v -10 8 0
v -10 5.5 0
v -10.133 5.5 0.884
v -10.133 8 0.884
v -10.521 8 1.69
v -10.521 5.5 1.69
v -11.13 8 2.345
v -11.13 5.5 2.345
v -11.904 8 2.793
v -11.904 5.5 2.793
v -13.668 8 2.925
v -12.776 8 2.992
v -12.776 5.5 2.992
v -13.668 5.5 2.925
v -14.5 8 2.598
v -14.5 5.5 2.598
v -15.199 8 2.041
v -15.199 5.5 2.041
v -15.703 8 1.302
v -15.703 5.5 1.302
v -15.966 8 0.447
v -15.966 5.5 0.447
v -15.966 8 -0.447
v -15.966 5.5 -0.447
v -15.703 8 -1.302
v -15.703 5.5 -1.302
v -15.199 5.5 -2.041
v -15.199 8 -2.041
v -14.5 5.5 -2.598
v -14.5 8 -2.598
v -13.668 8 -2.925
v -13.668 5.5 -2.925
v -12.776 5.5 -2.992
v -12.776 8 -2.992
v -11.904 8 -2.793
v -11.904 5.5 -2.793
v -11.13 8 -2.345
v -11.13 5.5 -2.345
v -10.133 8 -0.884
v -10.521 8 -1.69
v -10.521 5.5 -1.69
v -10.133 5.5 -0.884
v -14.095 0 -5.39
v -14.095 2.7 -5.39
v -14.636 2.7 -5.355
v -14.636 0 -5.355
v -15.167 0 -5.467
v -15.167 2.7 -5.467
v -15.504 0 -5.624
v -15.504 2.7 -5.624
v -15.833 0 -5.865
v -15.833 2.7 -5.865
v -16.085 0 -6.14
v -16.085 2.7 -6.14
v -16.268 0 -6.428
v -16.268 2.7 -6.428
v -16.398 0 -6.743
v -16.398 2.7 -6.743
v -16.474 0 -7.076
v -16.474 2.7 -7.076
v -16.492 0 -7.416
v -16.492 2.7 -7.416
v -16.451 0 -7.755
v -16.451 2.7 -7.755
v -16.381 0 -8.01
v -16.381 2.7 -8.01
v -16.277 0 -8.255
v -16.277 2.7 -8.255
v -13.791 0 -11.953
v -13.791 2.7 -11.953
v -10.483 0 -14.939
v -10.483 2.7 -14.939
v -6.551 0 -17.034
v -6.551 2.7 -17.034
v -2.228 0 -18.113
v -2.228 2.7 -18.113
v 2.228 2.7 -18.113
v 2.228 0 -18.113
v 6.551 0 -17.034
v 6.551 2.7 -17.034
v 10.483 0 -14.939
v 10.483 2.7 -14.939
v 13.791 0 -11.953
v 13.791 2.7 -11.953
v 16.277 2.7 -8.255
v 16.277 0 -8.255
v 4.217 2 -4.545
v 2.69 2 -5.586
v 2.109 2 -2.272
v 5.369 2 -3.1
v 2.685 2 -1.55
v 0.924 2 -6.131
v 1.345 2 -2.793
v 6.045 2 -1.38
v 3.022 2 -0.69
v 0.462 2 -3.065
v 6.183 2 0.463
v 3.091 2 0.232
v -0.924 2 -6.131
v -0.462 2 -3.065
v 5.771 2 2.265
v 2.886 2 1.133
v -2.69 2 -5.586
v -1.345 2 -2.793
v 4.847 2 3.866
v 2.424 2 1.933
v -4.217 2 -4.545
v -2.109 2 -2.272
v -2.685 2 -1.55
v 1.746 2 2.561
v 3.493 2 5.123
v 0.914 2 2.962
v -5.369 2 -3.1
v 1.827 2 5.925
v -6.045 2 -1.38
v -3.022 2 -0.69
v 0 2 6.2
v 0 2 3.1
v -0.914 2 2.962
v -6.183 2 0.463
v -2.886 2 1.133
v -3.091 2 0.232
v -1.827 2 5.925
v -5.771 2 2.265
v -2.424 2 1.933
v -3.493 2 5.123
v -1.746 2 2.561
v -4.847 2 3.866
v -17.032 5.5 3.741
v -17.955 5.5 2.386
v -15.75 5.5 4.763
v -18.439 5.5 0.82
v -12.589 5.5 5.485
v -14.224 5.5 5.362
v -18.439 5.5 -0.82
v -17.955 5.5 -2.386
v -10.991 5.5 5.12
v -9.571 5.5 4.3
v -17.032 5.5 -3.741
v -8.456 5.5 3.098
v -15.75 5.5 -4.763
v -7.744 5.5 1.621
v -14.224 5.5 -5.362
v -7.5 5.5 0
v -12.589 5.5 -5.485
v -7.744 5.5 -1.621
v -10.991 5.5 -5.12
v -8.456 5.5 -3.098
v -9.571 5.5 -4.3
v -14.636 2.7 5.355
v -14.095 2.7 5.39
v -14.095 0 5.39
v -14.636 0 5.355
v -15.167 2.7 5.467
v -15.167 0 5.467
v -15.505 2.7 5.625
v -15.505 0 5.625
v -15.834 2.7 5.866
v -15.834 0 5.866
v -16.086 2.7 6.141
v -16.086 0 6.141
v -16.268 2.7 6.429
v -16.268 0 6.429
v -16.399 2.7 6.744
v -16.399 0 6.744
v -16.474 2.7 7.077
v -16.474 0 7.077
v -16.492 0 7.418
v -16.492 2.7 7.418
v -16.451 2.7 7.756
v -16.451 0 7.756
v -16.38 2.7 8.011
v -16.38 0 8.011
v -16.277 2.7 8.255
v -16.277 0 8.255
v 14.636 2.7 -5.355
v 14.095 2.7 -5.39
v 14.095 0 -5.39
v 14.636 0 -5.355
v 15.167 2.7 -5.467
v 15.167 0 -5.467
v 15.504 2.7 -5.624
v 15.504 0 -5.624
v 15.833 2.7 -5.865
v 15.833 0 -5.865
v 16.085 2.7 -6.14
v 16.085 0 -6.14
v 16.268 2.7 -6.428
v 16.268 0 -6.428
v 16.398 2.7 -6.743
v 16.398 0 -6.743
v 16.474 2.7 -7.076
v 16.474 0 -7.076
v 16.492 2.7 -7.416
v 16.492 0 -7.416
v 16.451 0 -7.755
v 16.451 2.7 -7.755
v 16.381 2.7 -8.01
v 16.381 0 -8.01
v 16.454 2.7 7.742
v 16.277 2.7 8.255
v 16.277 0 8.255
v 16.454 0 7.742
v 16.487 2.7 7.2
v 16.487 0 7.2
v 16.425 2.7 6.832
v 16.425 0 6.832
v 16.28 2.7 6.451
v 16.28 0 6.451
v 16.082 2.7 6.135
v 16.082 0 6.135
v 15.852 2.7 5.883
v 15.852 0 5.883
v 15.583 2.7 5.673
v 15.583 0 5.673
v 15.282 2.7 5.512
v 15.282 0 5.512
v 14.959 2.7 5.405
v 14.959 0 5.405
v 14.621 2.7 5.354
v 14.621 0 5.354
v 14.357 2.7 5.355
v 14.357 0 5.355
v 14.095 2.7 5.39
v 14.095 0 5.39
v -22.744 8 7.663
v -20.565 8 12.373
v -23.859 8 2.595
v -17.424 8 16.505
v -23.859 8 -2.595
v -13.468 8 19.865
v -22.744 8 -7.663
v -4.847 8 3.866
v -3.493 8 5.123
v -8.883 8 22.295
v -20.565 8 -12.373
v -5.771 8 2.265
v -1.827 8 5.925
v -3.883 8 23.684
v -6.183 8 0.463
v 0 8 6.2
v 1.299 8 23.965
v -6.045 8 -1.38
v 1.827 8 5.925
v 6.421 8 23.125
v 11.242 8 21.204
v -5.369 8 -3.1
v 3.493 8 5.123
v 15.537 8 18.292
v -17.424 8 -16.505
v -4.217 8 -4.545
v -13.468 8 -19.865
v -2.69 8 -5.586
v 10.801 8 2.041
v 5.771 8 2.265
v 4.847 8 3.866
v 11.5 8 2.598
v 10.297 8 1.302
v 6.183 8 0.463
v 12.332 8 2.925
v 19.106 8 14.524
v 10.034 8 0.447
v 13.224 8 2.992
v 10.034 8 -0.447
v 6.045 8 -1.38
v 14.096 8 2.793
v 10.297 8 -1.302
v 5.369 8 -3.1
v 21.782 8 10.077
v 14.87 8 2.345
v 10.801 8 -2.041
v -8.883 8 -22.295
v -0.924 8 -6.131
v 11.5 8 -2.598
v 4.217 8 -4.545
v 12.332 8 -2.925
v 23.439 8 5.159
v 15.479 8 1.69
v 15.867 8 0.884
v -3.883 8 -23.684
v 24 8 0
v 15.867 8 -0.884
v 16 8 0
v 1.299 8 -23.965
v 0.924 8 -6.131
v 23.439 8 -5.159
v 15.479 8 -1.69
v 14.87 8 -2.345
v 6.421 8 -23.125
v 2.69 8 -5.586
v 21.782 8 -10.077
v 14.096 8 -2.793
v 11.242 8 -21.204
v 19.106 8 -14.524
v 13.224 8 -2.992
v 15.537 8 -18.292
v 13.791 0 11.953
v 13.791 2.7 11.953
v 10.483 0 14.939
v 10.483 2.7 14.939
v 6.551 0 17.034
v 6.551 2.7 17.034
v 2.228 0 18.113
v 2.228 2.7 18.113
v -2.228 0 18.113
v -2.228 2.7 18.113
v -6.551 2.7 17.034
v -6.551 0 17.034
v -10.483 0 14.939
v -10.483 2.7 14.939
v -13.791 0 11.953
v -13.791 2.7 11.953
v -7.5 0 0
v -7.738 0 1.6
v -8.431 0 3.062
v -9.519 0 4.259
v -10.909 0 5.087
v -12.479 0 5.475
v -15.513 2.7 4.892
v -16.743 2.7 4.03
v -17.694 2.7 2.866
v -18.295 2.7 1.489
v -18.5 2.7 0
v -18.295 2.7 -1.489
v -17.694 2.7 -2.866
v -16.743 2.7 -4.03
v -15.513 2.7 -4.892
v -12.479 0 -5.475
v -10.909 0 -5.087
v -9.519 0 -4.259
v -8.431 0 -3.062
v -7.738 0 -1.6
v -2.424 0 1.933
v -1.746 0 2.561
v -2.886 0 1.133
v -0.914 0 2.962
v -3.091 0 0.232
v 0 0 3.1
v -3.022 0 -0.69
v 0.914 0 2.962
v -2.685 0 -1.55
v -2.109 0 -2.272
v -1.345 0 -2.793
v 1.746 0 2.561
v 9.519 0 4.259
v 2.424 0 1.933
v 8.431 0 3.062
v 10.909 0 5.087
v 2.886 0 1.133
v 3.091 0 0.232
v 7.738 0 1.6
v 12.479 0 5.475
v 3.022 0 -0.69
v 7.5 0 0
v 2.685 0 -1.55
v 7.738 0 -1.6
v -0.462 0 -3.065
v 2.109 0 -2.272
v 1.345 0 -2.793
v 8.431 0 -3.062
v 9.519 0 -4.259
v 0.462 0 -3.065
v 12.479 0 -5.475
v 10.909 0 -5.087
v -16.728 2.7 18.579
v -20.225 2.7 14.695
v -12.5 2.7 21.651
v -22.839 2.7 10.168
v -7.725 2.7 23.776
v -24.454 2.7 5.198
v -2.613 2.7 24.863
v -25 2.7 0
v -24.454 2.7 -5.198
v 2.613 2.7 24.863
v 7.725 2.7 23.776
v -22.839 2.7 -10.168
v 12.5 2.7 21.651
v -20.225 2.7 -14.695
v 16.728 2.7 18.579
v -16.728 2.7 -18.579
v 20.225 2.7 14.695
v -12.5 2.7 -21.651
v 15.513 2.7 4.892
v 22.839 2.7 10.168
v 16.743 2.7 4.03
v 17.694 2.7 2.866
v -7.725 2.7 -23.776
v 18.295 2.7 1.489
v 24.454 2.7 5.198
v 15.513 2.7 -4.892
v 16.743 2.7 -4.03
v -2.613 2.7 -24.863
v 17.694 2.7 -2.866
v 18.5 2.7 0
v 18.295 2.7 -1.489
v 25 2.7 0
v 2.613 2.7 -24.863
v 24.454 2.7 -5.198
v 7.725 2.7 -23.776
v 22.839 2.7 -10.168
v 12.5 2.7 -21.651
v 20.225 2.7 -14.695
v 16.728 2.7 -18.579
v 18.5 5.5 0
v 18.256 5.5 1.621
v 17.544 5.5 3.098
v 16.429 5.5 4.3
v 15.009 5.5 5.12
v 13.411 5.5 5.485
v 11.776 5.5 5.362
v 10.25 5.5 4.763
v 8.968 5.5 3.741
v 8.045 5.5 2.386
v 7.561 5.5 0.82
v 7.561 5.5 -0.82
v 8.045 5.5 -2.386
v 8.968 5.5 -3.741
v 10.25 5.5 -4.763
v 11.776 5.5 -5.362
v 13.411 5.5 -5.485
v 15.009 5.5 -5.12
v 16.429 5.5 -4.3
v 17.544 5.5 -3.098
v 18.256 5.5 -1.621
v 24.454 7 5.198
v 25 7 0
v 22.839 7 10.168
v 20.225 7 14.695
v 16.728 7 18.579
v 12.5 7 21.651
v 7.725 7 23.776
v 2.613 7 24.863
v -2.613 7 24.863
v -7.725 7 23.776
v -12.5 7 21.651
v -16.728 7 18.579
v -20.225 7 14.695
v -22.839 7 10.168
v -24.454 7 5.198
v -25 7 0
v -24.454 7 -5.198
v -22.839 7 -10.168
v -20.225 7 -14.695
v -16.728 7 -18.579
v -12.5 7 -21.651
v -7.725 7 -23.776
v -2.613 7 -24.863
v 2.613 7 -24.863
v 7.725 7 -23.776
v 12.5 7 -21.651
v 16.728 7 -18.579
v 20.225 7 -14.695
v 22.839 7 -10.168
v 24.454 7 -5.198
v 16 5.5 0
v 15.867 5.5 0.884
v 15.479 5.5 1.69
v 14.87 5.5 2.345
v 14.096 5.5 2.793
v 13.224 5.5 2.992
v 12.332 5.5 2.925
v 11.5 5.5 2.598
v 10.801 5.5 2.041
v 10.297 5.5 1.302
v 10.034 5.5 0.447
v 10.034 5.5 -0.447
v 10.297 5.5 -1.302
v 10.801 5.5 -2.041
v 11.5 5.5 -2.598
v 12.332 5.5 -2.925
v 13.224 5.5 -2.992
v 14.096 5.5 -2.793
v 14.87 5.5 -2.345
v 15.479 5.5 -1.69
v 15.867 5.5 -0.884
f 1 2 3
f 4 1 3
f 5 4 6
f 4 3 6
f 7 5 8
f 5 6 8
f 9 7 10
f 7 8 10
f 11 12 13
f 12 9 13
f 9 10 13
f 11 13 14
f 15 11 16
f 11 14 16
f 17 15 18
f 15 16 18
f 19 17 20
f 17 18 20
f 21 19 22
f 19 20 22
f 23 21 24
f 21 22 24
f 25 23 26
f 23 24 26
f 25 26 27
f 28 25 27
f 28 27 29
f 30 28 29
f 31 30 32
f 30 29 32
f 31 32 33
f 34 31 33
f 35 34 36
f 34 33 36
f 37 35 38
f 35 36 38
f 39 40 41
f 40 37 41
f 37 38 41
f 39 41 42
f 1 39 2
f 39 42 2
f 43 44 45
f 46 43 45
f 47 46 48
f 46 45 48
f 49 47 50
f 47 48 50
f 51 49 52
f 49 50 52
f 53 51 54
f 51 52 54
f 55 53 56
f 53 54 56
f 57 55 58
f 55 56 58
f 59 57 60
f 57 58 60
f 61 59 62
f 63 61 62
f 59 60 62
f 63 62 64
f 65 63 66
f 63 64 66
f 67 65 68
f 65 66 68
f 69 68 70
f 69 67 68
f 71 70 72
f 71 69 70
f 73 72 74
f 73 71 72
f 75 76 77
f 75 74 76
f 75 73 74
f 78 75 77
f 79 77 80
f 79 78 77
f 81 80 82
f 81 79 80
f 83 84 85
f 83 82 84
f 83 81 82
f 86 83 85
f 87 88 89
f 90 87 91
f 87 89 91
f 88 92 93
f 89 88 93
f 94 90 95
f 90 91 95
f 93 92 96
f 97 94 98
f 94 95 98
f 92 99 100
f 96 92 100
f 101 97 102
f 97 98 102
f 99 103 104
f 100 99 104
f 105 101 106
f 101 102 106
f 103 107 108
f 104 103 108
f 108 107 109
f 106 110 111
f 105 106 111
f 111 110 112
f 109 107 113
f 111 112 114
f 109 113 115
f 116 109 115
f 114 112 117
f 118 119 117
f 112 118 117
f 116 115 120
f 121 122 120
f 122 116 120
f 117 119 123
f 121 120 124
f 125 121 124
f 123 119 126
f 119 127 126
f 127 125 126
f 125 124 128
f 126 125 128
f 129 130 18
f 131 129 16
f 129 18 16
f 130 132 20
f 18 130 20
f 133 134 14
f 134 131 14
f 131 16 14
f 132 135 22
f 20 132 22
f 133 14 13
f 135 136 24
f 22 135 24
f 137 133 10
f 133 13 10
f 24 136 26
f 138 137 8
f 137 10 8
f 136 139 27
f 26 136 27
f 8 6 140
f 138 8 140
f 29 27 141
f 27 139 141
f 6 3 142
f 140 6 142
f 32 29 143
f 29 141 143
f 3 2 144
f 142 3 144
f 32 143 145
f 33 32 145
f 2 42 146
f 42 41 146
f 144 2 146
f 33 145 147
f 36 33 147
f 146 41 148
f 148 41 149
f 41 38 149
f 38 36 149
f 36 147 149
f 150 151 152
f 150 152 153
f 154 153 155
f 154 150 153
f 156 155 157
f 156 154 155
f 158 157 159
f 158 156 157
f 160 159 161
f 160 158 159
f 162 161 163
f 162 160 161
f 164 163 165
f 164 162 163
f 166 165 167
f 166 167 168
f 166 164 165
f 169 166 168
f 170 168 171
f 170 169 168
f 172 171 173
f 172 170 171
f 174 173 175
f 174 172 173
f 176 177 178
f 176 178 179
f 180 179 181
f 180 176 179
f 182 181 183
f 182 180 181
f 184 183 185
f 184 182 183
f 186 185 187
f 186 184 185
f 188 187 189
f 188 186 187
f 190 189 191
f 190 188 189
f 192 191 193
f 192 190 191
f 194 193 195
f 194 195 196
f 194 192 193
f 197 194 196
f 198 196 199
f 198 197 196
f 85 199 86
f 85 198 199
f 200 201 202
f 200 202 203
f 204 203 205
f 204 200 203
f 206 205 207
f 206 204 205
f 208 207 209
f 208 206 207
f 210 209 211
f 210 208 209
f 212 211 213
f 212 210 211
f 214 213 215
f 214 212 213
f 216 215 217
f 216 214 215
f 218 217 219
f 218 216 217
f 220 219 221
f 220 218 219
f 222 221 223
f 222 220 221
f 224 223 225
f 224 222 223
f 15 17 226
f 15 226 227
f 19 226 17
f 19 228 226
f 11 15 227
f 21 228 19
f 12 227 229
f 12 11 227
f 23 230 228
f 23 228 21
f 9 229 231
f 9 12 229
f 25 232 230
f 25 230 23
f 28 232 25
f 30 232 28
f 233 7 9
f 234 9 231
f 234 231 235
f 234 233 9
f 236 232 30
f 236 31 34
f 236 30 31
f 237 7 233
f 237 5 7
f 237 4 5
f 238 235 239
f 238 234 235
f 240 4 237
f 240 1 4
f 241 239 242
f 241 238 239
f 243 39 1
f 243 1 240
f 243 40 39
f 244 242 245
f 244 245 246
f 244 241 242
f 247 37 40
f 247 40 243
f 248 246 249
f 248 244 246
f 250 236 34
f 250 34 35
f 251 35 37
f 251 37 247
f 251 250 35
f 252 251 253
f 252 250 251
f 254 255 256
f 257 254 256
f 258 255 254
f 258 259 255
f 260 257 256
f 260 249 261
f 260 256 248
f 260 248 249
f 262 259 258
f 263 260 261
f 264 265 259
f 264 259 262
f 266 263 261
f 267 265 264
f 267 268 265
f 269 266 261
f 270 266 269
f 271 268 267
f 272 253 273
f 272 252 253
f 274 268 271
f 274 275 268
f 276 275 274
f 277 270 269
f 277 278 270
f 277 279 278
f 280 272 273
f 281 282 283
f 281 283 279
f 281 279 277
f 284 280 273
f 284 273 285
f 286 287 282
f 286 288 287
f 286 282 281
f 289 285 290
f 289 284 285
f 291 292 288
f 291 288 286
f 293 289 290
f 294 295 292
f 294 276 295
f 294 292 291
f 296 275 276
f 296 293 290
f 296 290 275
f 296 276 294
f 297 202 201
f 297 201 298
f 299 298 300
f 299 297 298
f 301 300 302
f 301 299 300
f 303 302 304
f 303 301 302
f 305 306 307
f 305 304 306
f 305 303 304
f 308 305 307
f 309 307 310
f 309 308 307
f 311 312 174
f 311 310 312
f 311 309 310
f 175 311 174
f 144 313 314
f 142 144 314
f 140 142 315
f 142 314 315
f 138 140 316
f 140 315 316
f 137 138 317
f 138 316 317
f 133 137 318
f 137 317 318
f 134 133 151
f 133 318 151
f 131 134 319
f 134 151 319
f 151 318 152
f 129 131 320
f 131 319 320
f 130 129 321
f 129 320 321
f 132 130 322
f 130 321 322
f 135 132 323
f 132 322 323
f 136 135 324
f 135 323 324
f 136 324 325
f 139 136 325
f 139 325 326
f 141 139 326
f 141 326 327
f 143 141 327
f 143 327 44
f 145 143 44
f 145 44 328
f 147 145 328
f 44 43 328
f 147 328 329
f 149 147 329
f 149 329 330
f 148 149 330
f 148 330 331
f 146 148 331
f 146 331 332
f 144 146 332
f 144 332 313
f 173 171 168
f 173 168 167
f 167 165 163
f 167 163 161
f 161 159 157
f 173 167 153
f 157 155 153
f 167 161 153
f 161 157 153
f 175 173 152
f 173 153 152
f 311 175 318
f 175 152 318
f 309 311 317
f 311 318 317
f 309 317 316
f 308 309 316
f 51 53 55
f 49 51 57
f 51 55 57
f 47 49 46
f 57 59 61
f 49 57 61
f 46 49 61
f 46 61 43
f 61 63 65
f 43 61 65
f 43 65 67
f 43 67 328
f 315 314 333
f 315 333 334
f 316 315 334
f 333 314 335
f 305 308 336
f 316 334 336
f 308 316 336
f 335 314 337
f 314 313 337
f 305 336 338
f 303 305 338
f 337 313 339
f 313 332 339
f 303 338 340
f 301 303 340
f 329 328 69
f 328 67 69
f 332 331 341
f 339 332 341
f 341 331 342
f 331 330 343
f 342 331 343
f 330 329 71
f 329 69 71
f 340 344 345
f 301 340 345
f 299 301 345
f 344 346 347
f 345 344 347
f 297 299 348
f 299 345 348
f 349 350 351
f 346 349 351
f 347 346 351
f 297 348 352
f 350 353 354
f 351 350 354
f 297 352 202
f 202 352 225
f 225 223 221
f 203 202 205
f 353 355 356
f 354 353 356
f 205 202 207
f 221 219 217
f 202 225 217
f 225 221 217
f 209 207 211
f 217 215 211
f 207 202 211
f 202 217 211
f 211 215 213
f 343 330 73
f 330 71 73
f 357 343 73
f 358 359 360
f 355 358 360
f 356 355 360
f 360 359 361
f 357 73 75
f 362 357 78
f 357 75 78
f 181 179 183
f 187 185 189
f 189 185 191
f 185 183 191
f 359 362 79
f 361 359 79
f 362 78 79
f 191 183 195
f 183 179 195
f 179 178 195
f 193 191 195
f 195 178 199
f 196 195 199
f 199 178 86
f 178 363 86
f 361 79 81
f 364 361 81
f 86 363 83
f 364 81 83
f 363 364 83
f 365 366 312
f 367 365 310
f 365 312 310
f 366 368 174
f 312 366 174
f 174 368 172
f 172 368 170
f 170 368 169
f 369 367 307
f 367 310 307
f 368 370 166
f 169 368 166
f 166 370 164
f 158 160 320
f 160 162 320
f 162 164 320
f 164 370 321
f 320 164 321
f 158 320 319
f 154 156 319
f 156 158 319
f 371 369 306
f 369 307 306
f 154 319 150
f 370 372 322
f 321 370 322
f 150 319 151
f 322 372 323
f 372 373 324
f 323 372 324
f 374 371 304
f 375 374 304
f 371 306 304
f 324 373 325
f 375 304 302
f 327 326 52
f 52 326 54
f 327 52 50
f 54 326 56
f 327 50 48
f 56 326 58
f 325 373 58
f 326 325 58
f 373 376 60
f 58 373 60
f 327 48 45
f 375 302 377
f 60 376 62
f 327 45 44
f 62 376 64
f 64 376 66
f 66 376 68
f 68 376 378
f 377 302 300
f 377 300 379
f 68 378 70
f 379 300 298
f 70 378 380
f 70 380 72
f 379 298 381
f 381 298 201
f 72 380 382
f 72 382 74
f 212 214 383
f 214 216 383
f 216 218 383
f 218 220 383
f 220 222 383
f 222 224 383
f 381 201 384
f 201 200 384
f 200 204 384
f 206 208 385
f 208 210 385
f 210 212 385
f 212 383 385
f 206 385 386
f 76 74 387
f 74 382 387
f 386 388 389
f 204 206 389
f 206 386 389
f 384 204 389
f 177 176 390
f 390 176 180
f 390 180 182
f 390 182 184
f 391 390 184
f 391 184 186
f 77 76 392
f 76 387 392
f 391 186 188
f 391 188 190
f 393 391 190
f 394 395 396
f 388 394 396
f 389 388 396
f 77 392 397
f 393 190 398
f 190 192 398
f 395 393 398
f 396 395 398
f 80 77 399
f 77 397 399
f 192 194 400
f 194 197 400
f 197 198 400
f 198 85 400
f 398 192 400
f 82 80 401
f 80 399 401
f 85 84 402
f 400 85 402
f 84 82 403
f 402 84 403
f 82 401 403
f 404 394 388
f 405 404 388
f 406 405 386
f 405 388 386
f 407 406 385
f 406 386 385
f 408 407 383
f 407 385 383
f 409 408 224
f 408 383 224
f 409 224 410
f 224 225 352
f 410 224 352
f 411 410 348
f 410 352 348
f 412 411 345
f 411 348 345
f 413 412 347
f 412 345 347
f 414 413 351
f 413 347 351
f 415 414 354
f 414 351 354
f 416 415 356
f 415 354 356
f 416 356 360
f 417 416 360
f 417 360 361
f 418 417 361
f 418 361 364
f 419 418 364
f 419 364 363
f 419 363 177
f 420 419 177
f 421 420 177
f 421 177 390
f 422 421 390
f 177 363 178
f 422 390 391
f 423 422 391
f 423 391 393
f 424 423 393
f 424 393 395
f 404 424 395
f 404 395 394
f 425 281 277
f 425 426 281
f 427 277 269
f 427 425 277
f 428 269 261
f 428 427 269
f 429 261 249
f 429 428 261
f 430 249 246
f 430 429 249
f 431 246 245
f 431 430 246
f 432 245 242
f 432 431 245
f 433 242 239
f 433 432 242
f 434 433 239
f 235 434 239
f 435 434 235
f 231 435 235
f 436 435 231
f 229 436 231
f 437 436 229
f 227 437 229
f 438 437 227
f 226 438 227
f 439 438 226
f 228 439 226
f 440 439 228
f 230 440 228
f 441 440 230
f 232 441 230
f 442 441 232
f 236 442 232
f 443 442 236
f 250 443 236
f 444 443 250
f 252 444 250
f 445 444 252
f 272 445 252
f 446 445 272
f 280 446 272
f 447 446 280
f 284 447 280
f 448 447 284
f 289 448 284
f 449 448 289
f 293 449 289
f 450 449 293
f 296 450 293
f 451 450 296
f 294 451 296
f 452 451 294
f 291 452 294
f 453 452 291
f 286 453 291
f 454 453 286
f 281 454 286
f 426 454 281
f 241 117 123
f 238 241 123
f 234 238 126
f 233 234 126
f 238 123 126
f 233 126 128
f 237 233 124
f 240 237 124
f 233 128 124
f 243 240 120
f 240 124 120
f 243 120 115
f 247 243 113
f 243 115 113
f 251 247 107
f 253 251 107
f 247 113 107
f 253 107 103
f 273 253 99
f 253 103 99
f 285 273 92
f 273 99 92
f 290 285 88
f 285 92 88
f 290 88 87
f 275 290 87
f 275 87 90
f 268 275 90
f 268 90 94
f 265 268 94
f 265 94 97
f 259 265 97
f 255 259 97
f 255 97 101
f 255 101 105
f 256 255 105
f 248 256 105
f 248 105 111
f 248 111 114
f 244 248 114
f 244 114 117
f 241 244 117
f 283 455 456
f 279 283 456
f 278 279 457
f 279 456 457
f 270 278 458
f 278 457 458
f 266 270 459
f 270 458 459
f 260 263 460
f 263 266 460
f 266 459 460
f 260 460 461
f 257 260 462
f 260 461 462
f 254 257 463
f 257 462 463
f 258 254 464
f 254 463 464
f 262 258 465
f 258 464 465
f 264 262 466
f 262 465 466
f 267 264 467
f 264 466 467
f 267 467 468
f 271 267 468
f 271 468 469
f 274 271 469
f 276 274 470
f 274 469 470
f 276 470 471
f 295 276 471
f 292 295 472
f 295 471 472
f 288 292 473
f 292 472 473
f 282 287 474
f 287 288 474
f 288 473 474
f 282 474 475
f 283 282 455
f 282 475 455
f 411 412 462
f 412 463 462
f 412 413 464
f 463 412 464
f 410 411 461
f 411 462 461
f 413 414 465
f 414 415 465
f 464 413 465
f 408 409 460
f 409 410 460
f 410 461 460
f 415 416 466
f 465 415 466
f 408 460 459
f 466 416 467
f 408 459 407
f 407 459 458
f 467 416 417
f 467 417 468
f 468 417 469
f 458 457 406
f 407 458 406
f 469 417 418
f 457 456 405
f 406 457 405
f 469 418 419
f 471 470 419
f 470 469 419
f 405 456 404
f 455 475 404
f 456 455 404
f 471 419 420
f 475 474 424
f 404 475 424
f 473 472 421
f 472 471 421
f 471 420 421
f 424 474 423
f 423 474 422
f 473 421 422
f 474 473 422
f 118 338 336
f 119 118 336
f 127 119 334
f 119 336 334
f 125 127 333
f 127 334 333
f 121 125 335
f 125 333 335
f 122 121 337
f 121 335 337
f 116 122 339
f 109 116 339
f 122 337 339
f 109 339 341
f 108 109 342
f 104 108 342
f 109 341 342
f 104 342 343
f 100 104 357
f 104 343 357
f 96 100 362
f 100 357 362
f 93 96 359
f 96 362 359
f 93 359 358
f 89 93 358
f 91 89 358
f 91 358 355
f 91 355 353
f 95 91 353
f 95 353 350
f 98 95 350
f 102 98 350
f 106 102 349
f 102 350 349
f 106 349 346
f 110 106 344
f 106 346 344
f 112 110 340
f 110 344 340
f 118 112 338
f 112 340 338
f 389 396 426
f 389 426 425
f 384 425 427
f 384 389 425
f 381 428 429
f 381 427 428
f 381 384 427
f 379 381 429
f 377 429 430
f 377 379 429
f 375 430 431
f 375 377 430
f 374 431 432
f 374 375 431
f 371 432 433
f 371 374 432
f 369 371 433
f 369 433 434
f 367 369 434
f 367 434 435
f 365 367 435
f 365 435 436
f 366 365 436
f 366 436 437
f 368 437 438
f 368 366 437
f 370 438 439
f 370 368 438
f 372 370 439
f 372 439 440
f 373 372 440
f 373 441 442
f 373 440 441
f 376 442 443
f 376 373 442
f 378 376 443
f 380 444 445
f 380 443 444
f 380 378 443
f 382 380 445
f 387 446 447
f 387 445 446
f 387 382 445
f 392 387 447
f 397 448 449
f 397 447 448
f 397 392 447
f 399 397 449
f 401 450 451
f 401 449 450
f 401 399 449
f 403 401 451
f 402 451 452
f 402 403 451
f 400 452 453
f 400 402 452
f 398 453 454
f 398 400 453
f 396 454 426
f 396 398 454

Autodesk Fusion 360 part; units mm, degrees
sketch "Sketch1" plane through (0, 0, 0) normal (0, 1, 0) x (1, 0, 0)
  circle A0 centre (0, 0) radius 25
  circle A1 centre (-13, 0) radius 3
  circle A2 centre (13, 0) radius 3
  circle A3 centre (-13, 0) radius 5.5
  circle A4 centre (13, 0) radius 5.5
  circle A5 centre (0, 0) radius 18.25
  dimension "d1" = 50
  dimension "d2" = 26
  dimension "d3" = 13
  dimension "d4" = 6
  dimension "d5" = 6
  dimension "d17" = 11
  dimension "d18" = 11
  dimension "d41" = 36.5
extrude "Extrude1" add sketch "Sketch1" along normal blind 8 contours A0 | A3 A5 | A3 A4 A5 | A3 A5 | A4 A5 | A4 A5
sketch "Sketch2" plane through (0, 8, 0) normal (0, 1, 0) x (-1, 0, 0)
  circle A0 centre (13, 0) radius 3
  circle A1 centre (-13, 0) radius 3
  circle A2 centre (0, 0) radius 3
  circle A3 centre (0, 0) radius 25
  circle A4 centre (0, 0) radius 6.3
  dimension "d26" = 6
  dimension "d37" = 12.6
hole "Hole1" at (0, 8, 0) direction (0, -1, 0) diameter 6.2 depth 9 tip angle 118 counterbore diameter 12.4 counterbore depth 6
extrude "Extrude2" cut sketch "Sketch1" along normal blind 5.5 contours A3 A5 | A3 A5 | A4 A5 | A4 A5
extrude "Extrude4" cut sketch "Sketch1" along normal blind 2.7 contours A0
chamfer "Chamfer1" distance 1 angle 45 1 edges at (-23.3082, 8, 9.0404)
fillet "Fillet1" radius 2 4 edges at (-18.1466, 1.35, 1.9396) (-18.1466, 1.35, -1.9396) (18.1466, 1.35, 1.9396) (18.1466, 1.35, -1.9396)
sketch "Sketch3" plane through (0, 0, 0) normal (0, -1, 0) x (1, 0, 0)
  arc A0 (16.2765, -8.2545) -> (14.0947, -5.39) centre (14.4928, -7.3499) ccw
  arc A1 (14.0947, 5.39) -> (14.0947, -5.39) centre (13, 0) ccw
  arc A2 (14.0947, 5.39) -> (16.2765, 8.2545) centre (14.4928, 7.3499) ccw
  arc A3 (16.2765, 8.2545) -> (-16.2765, 8.2545) centre (0, 0) ccw
  arc A4 (-16.2765, 8.2545) -> (-14.0947, 5.39) centre (-14.4928, 7.3499) ccw
  arc A5 (-14.0947, -5.39) -> (-14.0947, 5.39) centre (-13, 0) ccw
  arc A6 (-14.0947, -5.39) -> (-16.2765, -8.2545) centre (-14.4928, -7.3499) ccw
  arc A7 (-16.2765, -8.2545) -> (16.2765, -8.2545) centre (0, 0) ccw
  circle A8 centre (0, 0) radius 3.1
  circle A9 centre (0, 0) radius 18.25
  dimension "d46" = 36.5
sketch "Sketch4" plane through (0, 0, 0) normal (0, -1, 0) x (1, 0, 0)
  arc A0 (16.2765, -8.2545) -> (14.0947, -5.39) centre (14.4928, -7.3499) ccw
  arc A1 (14.0947, 5.39) -> (14.0947, -5.39) centre (13, 0) ccw
  arc A2 (14.0947, 5.39) -> (16.2765, 8.2545) centre (14.4928, 7.3499) ccw
  arc A3 (16.2765, 8.2545) -> (-16.2765, 8.2545) centre (0, 0) ccw
  arc A4 (-16.2765, 8.2545) -> (-14.0947, 5.39) centre (-14.4928, 7.3499) ccw
  arc A5 (-14.0947, -5.39) -> (-14.0947, 5.39) centre (-13, 0) ccw
  arc A6 (-14.0947, -5.39) -> (-16.2765, -8.2545) centre (-14.4928, -7.3499) ccw
  arc A7 (-16.2765, -8.2545) -> (16.2765, -8.2545) centre (0, 0) ccw
  circle A8 centre (0, 0) radius 3.1
  line L0 (30, 27.5) -> (-30, 27.5)
  line L1 (-30, 27.5) -> (-30, -27.5)
  line L2 (-30, -27.5) -> (30, -27.5)
  line L3 (30, -27.5) -> (30, 27.5)
  line L4 (30, 27.5) -> (-30, -27.5) construction
  line L5 (-30, 27.5) -> (30, -27.5) construction
  dimension "d47" = 60
  dimension "d48" = 55
equation "d3 = d2 / 2"
